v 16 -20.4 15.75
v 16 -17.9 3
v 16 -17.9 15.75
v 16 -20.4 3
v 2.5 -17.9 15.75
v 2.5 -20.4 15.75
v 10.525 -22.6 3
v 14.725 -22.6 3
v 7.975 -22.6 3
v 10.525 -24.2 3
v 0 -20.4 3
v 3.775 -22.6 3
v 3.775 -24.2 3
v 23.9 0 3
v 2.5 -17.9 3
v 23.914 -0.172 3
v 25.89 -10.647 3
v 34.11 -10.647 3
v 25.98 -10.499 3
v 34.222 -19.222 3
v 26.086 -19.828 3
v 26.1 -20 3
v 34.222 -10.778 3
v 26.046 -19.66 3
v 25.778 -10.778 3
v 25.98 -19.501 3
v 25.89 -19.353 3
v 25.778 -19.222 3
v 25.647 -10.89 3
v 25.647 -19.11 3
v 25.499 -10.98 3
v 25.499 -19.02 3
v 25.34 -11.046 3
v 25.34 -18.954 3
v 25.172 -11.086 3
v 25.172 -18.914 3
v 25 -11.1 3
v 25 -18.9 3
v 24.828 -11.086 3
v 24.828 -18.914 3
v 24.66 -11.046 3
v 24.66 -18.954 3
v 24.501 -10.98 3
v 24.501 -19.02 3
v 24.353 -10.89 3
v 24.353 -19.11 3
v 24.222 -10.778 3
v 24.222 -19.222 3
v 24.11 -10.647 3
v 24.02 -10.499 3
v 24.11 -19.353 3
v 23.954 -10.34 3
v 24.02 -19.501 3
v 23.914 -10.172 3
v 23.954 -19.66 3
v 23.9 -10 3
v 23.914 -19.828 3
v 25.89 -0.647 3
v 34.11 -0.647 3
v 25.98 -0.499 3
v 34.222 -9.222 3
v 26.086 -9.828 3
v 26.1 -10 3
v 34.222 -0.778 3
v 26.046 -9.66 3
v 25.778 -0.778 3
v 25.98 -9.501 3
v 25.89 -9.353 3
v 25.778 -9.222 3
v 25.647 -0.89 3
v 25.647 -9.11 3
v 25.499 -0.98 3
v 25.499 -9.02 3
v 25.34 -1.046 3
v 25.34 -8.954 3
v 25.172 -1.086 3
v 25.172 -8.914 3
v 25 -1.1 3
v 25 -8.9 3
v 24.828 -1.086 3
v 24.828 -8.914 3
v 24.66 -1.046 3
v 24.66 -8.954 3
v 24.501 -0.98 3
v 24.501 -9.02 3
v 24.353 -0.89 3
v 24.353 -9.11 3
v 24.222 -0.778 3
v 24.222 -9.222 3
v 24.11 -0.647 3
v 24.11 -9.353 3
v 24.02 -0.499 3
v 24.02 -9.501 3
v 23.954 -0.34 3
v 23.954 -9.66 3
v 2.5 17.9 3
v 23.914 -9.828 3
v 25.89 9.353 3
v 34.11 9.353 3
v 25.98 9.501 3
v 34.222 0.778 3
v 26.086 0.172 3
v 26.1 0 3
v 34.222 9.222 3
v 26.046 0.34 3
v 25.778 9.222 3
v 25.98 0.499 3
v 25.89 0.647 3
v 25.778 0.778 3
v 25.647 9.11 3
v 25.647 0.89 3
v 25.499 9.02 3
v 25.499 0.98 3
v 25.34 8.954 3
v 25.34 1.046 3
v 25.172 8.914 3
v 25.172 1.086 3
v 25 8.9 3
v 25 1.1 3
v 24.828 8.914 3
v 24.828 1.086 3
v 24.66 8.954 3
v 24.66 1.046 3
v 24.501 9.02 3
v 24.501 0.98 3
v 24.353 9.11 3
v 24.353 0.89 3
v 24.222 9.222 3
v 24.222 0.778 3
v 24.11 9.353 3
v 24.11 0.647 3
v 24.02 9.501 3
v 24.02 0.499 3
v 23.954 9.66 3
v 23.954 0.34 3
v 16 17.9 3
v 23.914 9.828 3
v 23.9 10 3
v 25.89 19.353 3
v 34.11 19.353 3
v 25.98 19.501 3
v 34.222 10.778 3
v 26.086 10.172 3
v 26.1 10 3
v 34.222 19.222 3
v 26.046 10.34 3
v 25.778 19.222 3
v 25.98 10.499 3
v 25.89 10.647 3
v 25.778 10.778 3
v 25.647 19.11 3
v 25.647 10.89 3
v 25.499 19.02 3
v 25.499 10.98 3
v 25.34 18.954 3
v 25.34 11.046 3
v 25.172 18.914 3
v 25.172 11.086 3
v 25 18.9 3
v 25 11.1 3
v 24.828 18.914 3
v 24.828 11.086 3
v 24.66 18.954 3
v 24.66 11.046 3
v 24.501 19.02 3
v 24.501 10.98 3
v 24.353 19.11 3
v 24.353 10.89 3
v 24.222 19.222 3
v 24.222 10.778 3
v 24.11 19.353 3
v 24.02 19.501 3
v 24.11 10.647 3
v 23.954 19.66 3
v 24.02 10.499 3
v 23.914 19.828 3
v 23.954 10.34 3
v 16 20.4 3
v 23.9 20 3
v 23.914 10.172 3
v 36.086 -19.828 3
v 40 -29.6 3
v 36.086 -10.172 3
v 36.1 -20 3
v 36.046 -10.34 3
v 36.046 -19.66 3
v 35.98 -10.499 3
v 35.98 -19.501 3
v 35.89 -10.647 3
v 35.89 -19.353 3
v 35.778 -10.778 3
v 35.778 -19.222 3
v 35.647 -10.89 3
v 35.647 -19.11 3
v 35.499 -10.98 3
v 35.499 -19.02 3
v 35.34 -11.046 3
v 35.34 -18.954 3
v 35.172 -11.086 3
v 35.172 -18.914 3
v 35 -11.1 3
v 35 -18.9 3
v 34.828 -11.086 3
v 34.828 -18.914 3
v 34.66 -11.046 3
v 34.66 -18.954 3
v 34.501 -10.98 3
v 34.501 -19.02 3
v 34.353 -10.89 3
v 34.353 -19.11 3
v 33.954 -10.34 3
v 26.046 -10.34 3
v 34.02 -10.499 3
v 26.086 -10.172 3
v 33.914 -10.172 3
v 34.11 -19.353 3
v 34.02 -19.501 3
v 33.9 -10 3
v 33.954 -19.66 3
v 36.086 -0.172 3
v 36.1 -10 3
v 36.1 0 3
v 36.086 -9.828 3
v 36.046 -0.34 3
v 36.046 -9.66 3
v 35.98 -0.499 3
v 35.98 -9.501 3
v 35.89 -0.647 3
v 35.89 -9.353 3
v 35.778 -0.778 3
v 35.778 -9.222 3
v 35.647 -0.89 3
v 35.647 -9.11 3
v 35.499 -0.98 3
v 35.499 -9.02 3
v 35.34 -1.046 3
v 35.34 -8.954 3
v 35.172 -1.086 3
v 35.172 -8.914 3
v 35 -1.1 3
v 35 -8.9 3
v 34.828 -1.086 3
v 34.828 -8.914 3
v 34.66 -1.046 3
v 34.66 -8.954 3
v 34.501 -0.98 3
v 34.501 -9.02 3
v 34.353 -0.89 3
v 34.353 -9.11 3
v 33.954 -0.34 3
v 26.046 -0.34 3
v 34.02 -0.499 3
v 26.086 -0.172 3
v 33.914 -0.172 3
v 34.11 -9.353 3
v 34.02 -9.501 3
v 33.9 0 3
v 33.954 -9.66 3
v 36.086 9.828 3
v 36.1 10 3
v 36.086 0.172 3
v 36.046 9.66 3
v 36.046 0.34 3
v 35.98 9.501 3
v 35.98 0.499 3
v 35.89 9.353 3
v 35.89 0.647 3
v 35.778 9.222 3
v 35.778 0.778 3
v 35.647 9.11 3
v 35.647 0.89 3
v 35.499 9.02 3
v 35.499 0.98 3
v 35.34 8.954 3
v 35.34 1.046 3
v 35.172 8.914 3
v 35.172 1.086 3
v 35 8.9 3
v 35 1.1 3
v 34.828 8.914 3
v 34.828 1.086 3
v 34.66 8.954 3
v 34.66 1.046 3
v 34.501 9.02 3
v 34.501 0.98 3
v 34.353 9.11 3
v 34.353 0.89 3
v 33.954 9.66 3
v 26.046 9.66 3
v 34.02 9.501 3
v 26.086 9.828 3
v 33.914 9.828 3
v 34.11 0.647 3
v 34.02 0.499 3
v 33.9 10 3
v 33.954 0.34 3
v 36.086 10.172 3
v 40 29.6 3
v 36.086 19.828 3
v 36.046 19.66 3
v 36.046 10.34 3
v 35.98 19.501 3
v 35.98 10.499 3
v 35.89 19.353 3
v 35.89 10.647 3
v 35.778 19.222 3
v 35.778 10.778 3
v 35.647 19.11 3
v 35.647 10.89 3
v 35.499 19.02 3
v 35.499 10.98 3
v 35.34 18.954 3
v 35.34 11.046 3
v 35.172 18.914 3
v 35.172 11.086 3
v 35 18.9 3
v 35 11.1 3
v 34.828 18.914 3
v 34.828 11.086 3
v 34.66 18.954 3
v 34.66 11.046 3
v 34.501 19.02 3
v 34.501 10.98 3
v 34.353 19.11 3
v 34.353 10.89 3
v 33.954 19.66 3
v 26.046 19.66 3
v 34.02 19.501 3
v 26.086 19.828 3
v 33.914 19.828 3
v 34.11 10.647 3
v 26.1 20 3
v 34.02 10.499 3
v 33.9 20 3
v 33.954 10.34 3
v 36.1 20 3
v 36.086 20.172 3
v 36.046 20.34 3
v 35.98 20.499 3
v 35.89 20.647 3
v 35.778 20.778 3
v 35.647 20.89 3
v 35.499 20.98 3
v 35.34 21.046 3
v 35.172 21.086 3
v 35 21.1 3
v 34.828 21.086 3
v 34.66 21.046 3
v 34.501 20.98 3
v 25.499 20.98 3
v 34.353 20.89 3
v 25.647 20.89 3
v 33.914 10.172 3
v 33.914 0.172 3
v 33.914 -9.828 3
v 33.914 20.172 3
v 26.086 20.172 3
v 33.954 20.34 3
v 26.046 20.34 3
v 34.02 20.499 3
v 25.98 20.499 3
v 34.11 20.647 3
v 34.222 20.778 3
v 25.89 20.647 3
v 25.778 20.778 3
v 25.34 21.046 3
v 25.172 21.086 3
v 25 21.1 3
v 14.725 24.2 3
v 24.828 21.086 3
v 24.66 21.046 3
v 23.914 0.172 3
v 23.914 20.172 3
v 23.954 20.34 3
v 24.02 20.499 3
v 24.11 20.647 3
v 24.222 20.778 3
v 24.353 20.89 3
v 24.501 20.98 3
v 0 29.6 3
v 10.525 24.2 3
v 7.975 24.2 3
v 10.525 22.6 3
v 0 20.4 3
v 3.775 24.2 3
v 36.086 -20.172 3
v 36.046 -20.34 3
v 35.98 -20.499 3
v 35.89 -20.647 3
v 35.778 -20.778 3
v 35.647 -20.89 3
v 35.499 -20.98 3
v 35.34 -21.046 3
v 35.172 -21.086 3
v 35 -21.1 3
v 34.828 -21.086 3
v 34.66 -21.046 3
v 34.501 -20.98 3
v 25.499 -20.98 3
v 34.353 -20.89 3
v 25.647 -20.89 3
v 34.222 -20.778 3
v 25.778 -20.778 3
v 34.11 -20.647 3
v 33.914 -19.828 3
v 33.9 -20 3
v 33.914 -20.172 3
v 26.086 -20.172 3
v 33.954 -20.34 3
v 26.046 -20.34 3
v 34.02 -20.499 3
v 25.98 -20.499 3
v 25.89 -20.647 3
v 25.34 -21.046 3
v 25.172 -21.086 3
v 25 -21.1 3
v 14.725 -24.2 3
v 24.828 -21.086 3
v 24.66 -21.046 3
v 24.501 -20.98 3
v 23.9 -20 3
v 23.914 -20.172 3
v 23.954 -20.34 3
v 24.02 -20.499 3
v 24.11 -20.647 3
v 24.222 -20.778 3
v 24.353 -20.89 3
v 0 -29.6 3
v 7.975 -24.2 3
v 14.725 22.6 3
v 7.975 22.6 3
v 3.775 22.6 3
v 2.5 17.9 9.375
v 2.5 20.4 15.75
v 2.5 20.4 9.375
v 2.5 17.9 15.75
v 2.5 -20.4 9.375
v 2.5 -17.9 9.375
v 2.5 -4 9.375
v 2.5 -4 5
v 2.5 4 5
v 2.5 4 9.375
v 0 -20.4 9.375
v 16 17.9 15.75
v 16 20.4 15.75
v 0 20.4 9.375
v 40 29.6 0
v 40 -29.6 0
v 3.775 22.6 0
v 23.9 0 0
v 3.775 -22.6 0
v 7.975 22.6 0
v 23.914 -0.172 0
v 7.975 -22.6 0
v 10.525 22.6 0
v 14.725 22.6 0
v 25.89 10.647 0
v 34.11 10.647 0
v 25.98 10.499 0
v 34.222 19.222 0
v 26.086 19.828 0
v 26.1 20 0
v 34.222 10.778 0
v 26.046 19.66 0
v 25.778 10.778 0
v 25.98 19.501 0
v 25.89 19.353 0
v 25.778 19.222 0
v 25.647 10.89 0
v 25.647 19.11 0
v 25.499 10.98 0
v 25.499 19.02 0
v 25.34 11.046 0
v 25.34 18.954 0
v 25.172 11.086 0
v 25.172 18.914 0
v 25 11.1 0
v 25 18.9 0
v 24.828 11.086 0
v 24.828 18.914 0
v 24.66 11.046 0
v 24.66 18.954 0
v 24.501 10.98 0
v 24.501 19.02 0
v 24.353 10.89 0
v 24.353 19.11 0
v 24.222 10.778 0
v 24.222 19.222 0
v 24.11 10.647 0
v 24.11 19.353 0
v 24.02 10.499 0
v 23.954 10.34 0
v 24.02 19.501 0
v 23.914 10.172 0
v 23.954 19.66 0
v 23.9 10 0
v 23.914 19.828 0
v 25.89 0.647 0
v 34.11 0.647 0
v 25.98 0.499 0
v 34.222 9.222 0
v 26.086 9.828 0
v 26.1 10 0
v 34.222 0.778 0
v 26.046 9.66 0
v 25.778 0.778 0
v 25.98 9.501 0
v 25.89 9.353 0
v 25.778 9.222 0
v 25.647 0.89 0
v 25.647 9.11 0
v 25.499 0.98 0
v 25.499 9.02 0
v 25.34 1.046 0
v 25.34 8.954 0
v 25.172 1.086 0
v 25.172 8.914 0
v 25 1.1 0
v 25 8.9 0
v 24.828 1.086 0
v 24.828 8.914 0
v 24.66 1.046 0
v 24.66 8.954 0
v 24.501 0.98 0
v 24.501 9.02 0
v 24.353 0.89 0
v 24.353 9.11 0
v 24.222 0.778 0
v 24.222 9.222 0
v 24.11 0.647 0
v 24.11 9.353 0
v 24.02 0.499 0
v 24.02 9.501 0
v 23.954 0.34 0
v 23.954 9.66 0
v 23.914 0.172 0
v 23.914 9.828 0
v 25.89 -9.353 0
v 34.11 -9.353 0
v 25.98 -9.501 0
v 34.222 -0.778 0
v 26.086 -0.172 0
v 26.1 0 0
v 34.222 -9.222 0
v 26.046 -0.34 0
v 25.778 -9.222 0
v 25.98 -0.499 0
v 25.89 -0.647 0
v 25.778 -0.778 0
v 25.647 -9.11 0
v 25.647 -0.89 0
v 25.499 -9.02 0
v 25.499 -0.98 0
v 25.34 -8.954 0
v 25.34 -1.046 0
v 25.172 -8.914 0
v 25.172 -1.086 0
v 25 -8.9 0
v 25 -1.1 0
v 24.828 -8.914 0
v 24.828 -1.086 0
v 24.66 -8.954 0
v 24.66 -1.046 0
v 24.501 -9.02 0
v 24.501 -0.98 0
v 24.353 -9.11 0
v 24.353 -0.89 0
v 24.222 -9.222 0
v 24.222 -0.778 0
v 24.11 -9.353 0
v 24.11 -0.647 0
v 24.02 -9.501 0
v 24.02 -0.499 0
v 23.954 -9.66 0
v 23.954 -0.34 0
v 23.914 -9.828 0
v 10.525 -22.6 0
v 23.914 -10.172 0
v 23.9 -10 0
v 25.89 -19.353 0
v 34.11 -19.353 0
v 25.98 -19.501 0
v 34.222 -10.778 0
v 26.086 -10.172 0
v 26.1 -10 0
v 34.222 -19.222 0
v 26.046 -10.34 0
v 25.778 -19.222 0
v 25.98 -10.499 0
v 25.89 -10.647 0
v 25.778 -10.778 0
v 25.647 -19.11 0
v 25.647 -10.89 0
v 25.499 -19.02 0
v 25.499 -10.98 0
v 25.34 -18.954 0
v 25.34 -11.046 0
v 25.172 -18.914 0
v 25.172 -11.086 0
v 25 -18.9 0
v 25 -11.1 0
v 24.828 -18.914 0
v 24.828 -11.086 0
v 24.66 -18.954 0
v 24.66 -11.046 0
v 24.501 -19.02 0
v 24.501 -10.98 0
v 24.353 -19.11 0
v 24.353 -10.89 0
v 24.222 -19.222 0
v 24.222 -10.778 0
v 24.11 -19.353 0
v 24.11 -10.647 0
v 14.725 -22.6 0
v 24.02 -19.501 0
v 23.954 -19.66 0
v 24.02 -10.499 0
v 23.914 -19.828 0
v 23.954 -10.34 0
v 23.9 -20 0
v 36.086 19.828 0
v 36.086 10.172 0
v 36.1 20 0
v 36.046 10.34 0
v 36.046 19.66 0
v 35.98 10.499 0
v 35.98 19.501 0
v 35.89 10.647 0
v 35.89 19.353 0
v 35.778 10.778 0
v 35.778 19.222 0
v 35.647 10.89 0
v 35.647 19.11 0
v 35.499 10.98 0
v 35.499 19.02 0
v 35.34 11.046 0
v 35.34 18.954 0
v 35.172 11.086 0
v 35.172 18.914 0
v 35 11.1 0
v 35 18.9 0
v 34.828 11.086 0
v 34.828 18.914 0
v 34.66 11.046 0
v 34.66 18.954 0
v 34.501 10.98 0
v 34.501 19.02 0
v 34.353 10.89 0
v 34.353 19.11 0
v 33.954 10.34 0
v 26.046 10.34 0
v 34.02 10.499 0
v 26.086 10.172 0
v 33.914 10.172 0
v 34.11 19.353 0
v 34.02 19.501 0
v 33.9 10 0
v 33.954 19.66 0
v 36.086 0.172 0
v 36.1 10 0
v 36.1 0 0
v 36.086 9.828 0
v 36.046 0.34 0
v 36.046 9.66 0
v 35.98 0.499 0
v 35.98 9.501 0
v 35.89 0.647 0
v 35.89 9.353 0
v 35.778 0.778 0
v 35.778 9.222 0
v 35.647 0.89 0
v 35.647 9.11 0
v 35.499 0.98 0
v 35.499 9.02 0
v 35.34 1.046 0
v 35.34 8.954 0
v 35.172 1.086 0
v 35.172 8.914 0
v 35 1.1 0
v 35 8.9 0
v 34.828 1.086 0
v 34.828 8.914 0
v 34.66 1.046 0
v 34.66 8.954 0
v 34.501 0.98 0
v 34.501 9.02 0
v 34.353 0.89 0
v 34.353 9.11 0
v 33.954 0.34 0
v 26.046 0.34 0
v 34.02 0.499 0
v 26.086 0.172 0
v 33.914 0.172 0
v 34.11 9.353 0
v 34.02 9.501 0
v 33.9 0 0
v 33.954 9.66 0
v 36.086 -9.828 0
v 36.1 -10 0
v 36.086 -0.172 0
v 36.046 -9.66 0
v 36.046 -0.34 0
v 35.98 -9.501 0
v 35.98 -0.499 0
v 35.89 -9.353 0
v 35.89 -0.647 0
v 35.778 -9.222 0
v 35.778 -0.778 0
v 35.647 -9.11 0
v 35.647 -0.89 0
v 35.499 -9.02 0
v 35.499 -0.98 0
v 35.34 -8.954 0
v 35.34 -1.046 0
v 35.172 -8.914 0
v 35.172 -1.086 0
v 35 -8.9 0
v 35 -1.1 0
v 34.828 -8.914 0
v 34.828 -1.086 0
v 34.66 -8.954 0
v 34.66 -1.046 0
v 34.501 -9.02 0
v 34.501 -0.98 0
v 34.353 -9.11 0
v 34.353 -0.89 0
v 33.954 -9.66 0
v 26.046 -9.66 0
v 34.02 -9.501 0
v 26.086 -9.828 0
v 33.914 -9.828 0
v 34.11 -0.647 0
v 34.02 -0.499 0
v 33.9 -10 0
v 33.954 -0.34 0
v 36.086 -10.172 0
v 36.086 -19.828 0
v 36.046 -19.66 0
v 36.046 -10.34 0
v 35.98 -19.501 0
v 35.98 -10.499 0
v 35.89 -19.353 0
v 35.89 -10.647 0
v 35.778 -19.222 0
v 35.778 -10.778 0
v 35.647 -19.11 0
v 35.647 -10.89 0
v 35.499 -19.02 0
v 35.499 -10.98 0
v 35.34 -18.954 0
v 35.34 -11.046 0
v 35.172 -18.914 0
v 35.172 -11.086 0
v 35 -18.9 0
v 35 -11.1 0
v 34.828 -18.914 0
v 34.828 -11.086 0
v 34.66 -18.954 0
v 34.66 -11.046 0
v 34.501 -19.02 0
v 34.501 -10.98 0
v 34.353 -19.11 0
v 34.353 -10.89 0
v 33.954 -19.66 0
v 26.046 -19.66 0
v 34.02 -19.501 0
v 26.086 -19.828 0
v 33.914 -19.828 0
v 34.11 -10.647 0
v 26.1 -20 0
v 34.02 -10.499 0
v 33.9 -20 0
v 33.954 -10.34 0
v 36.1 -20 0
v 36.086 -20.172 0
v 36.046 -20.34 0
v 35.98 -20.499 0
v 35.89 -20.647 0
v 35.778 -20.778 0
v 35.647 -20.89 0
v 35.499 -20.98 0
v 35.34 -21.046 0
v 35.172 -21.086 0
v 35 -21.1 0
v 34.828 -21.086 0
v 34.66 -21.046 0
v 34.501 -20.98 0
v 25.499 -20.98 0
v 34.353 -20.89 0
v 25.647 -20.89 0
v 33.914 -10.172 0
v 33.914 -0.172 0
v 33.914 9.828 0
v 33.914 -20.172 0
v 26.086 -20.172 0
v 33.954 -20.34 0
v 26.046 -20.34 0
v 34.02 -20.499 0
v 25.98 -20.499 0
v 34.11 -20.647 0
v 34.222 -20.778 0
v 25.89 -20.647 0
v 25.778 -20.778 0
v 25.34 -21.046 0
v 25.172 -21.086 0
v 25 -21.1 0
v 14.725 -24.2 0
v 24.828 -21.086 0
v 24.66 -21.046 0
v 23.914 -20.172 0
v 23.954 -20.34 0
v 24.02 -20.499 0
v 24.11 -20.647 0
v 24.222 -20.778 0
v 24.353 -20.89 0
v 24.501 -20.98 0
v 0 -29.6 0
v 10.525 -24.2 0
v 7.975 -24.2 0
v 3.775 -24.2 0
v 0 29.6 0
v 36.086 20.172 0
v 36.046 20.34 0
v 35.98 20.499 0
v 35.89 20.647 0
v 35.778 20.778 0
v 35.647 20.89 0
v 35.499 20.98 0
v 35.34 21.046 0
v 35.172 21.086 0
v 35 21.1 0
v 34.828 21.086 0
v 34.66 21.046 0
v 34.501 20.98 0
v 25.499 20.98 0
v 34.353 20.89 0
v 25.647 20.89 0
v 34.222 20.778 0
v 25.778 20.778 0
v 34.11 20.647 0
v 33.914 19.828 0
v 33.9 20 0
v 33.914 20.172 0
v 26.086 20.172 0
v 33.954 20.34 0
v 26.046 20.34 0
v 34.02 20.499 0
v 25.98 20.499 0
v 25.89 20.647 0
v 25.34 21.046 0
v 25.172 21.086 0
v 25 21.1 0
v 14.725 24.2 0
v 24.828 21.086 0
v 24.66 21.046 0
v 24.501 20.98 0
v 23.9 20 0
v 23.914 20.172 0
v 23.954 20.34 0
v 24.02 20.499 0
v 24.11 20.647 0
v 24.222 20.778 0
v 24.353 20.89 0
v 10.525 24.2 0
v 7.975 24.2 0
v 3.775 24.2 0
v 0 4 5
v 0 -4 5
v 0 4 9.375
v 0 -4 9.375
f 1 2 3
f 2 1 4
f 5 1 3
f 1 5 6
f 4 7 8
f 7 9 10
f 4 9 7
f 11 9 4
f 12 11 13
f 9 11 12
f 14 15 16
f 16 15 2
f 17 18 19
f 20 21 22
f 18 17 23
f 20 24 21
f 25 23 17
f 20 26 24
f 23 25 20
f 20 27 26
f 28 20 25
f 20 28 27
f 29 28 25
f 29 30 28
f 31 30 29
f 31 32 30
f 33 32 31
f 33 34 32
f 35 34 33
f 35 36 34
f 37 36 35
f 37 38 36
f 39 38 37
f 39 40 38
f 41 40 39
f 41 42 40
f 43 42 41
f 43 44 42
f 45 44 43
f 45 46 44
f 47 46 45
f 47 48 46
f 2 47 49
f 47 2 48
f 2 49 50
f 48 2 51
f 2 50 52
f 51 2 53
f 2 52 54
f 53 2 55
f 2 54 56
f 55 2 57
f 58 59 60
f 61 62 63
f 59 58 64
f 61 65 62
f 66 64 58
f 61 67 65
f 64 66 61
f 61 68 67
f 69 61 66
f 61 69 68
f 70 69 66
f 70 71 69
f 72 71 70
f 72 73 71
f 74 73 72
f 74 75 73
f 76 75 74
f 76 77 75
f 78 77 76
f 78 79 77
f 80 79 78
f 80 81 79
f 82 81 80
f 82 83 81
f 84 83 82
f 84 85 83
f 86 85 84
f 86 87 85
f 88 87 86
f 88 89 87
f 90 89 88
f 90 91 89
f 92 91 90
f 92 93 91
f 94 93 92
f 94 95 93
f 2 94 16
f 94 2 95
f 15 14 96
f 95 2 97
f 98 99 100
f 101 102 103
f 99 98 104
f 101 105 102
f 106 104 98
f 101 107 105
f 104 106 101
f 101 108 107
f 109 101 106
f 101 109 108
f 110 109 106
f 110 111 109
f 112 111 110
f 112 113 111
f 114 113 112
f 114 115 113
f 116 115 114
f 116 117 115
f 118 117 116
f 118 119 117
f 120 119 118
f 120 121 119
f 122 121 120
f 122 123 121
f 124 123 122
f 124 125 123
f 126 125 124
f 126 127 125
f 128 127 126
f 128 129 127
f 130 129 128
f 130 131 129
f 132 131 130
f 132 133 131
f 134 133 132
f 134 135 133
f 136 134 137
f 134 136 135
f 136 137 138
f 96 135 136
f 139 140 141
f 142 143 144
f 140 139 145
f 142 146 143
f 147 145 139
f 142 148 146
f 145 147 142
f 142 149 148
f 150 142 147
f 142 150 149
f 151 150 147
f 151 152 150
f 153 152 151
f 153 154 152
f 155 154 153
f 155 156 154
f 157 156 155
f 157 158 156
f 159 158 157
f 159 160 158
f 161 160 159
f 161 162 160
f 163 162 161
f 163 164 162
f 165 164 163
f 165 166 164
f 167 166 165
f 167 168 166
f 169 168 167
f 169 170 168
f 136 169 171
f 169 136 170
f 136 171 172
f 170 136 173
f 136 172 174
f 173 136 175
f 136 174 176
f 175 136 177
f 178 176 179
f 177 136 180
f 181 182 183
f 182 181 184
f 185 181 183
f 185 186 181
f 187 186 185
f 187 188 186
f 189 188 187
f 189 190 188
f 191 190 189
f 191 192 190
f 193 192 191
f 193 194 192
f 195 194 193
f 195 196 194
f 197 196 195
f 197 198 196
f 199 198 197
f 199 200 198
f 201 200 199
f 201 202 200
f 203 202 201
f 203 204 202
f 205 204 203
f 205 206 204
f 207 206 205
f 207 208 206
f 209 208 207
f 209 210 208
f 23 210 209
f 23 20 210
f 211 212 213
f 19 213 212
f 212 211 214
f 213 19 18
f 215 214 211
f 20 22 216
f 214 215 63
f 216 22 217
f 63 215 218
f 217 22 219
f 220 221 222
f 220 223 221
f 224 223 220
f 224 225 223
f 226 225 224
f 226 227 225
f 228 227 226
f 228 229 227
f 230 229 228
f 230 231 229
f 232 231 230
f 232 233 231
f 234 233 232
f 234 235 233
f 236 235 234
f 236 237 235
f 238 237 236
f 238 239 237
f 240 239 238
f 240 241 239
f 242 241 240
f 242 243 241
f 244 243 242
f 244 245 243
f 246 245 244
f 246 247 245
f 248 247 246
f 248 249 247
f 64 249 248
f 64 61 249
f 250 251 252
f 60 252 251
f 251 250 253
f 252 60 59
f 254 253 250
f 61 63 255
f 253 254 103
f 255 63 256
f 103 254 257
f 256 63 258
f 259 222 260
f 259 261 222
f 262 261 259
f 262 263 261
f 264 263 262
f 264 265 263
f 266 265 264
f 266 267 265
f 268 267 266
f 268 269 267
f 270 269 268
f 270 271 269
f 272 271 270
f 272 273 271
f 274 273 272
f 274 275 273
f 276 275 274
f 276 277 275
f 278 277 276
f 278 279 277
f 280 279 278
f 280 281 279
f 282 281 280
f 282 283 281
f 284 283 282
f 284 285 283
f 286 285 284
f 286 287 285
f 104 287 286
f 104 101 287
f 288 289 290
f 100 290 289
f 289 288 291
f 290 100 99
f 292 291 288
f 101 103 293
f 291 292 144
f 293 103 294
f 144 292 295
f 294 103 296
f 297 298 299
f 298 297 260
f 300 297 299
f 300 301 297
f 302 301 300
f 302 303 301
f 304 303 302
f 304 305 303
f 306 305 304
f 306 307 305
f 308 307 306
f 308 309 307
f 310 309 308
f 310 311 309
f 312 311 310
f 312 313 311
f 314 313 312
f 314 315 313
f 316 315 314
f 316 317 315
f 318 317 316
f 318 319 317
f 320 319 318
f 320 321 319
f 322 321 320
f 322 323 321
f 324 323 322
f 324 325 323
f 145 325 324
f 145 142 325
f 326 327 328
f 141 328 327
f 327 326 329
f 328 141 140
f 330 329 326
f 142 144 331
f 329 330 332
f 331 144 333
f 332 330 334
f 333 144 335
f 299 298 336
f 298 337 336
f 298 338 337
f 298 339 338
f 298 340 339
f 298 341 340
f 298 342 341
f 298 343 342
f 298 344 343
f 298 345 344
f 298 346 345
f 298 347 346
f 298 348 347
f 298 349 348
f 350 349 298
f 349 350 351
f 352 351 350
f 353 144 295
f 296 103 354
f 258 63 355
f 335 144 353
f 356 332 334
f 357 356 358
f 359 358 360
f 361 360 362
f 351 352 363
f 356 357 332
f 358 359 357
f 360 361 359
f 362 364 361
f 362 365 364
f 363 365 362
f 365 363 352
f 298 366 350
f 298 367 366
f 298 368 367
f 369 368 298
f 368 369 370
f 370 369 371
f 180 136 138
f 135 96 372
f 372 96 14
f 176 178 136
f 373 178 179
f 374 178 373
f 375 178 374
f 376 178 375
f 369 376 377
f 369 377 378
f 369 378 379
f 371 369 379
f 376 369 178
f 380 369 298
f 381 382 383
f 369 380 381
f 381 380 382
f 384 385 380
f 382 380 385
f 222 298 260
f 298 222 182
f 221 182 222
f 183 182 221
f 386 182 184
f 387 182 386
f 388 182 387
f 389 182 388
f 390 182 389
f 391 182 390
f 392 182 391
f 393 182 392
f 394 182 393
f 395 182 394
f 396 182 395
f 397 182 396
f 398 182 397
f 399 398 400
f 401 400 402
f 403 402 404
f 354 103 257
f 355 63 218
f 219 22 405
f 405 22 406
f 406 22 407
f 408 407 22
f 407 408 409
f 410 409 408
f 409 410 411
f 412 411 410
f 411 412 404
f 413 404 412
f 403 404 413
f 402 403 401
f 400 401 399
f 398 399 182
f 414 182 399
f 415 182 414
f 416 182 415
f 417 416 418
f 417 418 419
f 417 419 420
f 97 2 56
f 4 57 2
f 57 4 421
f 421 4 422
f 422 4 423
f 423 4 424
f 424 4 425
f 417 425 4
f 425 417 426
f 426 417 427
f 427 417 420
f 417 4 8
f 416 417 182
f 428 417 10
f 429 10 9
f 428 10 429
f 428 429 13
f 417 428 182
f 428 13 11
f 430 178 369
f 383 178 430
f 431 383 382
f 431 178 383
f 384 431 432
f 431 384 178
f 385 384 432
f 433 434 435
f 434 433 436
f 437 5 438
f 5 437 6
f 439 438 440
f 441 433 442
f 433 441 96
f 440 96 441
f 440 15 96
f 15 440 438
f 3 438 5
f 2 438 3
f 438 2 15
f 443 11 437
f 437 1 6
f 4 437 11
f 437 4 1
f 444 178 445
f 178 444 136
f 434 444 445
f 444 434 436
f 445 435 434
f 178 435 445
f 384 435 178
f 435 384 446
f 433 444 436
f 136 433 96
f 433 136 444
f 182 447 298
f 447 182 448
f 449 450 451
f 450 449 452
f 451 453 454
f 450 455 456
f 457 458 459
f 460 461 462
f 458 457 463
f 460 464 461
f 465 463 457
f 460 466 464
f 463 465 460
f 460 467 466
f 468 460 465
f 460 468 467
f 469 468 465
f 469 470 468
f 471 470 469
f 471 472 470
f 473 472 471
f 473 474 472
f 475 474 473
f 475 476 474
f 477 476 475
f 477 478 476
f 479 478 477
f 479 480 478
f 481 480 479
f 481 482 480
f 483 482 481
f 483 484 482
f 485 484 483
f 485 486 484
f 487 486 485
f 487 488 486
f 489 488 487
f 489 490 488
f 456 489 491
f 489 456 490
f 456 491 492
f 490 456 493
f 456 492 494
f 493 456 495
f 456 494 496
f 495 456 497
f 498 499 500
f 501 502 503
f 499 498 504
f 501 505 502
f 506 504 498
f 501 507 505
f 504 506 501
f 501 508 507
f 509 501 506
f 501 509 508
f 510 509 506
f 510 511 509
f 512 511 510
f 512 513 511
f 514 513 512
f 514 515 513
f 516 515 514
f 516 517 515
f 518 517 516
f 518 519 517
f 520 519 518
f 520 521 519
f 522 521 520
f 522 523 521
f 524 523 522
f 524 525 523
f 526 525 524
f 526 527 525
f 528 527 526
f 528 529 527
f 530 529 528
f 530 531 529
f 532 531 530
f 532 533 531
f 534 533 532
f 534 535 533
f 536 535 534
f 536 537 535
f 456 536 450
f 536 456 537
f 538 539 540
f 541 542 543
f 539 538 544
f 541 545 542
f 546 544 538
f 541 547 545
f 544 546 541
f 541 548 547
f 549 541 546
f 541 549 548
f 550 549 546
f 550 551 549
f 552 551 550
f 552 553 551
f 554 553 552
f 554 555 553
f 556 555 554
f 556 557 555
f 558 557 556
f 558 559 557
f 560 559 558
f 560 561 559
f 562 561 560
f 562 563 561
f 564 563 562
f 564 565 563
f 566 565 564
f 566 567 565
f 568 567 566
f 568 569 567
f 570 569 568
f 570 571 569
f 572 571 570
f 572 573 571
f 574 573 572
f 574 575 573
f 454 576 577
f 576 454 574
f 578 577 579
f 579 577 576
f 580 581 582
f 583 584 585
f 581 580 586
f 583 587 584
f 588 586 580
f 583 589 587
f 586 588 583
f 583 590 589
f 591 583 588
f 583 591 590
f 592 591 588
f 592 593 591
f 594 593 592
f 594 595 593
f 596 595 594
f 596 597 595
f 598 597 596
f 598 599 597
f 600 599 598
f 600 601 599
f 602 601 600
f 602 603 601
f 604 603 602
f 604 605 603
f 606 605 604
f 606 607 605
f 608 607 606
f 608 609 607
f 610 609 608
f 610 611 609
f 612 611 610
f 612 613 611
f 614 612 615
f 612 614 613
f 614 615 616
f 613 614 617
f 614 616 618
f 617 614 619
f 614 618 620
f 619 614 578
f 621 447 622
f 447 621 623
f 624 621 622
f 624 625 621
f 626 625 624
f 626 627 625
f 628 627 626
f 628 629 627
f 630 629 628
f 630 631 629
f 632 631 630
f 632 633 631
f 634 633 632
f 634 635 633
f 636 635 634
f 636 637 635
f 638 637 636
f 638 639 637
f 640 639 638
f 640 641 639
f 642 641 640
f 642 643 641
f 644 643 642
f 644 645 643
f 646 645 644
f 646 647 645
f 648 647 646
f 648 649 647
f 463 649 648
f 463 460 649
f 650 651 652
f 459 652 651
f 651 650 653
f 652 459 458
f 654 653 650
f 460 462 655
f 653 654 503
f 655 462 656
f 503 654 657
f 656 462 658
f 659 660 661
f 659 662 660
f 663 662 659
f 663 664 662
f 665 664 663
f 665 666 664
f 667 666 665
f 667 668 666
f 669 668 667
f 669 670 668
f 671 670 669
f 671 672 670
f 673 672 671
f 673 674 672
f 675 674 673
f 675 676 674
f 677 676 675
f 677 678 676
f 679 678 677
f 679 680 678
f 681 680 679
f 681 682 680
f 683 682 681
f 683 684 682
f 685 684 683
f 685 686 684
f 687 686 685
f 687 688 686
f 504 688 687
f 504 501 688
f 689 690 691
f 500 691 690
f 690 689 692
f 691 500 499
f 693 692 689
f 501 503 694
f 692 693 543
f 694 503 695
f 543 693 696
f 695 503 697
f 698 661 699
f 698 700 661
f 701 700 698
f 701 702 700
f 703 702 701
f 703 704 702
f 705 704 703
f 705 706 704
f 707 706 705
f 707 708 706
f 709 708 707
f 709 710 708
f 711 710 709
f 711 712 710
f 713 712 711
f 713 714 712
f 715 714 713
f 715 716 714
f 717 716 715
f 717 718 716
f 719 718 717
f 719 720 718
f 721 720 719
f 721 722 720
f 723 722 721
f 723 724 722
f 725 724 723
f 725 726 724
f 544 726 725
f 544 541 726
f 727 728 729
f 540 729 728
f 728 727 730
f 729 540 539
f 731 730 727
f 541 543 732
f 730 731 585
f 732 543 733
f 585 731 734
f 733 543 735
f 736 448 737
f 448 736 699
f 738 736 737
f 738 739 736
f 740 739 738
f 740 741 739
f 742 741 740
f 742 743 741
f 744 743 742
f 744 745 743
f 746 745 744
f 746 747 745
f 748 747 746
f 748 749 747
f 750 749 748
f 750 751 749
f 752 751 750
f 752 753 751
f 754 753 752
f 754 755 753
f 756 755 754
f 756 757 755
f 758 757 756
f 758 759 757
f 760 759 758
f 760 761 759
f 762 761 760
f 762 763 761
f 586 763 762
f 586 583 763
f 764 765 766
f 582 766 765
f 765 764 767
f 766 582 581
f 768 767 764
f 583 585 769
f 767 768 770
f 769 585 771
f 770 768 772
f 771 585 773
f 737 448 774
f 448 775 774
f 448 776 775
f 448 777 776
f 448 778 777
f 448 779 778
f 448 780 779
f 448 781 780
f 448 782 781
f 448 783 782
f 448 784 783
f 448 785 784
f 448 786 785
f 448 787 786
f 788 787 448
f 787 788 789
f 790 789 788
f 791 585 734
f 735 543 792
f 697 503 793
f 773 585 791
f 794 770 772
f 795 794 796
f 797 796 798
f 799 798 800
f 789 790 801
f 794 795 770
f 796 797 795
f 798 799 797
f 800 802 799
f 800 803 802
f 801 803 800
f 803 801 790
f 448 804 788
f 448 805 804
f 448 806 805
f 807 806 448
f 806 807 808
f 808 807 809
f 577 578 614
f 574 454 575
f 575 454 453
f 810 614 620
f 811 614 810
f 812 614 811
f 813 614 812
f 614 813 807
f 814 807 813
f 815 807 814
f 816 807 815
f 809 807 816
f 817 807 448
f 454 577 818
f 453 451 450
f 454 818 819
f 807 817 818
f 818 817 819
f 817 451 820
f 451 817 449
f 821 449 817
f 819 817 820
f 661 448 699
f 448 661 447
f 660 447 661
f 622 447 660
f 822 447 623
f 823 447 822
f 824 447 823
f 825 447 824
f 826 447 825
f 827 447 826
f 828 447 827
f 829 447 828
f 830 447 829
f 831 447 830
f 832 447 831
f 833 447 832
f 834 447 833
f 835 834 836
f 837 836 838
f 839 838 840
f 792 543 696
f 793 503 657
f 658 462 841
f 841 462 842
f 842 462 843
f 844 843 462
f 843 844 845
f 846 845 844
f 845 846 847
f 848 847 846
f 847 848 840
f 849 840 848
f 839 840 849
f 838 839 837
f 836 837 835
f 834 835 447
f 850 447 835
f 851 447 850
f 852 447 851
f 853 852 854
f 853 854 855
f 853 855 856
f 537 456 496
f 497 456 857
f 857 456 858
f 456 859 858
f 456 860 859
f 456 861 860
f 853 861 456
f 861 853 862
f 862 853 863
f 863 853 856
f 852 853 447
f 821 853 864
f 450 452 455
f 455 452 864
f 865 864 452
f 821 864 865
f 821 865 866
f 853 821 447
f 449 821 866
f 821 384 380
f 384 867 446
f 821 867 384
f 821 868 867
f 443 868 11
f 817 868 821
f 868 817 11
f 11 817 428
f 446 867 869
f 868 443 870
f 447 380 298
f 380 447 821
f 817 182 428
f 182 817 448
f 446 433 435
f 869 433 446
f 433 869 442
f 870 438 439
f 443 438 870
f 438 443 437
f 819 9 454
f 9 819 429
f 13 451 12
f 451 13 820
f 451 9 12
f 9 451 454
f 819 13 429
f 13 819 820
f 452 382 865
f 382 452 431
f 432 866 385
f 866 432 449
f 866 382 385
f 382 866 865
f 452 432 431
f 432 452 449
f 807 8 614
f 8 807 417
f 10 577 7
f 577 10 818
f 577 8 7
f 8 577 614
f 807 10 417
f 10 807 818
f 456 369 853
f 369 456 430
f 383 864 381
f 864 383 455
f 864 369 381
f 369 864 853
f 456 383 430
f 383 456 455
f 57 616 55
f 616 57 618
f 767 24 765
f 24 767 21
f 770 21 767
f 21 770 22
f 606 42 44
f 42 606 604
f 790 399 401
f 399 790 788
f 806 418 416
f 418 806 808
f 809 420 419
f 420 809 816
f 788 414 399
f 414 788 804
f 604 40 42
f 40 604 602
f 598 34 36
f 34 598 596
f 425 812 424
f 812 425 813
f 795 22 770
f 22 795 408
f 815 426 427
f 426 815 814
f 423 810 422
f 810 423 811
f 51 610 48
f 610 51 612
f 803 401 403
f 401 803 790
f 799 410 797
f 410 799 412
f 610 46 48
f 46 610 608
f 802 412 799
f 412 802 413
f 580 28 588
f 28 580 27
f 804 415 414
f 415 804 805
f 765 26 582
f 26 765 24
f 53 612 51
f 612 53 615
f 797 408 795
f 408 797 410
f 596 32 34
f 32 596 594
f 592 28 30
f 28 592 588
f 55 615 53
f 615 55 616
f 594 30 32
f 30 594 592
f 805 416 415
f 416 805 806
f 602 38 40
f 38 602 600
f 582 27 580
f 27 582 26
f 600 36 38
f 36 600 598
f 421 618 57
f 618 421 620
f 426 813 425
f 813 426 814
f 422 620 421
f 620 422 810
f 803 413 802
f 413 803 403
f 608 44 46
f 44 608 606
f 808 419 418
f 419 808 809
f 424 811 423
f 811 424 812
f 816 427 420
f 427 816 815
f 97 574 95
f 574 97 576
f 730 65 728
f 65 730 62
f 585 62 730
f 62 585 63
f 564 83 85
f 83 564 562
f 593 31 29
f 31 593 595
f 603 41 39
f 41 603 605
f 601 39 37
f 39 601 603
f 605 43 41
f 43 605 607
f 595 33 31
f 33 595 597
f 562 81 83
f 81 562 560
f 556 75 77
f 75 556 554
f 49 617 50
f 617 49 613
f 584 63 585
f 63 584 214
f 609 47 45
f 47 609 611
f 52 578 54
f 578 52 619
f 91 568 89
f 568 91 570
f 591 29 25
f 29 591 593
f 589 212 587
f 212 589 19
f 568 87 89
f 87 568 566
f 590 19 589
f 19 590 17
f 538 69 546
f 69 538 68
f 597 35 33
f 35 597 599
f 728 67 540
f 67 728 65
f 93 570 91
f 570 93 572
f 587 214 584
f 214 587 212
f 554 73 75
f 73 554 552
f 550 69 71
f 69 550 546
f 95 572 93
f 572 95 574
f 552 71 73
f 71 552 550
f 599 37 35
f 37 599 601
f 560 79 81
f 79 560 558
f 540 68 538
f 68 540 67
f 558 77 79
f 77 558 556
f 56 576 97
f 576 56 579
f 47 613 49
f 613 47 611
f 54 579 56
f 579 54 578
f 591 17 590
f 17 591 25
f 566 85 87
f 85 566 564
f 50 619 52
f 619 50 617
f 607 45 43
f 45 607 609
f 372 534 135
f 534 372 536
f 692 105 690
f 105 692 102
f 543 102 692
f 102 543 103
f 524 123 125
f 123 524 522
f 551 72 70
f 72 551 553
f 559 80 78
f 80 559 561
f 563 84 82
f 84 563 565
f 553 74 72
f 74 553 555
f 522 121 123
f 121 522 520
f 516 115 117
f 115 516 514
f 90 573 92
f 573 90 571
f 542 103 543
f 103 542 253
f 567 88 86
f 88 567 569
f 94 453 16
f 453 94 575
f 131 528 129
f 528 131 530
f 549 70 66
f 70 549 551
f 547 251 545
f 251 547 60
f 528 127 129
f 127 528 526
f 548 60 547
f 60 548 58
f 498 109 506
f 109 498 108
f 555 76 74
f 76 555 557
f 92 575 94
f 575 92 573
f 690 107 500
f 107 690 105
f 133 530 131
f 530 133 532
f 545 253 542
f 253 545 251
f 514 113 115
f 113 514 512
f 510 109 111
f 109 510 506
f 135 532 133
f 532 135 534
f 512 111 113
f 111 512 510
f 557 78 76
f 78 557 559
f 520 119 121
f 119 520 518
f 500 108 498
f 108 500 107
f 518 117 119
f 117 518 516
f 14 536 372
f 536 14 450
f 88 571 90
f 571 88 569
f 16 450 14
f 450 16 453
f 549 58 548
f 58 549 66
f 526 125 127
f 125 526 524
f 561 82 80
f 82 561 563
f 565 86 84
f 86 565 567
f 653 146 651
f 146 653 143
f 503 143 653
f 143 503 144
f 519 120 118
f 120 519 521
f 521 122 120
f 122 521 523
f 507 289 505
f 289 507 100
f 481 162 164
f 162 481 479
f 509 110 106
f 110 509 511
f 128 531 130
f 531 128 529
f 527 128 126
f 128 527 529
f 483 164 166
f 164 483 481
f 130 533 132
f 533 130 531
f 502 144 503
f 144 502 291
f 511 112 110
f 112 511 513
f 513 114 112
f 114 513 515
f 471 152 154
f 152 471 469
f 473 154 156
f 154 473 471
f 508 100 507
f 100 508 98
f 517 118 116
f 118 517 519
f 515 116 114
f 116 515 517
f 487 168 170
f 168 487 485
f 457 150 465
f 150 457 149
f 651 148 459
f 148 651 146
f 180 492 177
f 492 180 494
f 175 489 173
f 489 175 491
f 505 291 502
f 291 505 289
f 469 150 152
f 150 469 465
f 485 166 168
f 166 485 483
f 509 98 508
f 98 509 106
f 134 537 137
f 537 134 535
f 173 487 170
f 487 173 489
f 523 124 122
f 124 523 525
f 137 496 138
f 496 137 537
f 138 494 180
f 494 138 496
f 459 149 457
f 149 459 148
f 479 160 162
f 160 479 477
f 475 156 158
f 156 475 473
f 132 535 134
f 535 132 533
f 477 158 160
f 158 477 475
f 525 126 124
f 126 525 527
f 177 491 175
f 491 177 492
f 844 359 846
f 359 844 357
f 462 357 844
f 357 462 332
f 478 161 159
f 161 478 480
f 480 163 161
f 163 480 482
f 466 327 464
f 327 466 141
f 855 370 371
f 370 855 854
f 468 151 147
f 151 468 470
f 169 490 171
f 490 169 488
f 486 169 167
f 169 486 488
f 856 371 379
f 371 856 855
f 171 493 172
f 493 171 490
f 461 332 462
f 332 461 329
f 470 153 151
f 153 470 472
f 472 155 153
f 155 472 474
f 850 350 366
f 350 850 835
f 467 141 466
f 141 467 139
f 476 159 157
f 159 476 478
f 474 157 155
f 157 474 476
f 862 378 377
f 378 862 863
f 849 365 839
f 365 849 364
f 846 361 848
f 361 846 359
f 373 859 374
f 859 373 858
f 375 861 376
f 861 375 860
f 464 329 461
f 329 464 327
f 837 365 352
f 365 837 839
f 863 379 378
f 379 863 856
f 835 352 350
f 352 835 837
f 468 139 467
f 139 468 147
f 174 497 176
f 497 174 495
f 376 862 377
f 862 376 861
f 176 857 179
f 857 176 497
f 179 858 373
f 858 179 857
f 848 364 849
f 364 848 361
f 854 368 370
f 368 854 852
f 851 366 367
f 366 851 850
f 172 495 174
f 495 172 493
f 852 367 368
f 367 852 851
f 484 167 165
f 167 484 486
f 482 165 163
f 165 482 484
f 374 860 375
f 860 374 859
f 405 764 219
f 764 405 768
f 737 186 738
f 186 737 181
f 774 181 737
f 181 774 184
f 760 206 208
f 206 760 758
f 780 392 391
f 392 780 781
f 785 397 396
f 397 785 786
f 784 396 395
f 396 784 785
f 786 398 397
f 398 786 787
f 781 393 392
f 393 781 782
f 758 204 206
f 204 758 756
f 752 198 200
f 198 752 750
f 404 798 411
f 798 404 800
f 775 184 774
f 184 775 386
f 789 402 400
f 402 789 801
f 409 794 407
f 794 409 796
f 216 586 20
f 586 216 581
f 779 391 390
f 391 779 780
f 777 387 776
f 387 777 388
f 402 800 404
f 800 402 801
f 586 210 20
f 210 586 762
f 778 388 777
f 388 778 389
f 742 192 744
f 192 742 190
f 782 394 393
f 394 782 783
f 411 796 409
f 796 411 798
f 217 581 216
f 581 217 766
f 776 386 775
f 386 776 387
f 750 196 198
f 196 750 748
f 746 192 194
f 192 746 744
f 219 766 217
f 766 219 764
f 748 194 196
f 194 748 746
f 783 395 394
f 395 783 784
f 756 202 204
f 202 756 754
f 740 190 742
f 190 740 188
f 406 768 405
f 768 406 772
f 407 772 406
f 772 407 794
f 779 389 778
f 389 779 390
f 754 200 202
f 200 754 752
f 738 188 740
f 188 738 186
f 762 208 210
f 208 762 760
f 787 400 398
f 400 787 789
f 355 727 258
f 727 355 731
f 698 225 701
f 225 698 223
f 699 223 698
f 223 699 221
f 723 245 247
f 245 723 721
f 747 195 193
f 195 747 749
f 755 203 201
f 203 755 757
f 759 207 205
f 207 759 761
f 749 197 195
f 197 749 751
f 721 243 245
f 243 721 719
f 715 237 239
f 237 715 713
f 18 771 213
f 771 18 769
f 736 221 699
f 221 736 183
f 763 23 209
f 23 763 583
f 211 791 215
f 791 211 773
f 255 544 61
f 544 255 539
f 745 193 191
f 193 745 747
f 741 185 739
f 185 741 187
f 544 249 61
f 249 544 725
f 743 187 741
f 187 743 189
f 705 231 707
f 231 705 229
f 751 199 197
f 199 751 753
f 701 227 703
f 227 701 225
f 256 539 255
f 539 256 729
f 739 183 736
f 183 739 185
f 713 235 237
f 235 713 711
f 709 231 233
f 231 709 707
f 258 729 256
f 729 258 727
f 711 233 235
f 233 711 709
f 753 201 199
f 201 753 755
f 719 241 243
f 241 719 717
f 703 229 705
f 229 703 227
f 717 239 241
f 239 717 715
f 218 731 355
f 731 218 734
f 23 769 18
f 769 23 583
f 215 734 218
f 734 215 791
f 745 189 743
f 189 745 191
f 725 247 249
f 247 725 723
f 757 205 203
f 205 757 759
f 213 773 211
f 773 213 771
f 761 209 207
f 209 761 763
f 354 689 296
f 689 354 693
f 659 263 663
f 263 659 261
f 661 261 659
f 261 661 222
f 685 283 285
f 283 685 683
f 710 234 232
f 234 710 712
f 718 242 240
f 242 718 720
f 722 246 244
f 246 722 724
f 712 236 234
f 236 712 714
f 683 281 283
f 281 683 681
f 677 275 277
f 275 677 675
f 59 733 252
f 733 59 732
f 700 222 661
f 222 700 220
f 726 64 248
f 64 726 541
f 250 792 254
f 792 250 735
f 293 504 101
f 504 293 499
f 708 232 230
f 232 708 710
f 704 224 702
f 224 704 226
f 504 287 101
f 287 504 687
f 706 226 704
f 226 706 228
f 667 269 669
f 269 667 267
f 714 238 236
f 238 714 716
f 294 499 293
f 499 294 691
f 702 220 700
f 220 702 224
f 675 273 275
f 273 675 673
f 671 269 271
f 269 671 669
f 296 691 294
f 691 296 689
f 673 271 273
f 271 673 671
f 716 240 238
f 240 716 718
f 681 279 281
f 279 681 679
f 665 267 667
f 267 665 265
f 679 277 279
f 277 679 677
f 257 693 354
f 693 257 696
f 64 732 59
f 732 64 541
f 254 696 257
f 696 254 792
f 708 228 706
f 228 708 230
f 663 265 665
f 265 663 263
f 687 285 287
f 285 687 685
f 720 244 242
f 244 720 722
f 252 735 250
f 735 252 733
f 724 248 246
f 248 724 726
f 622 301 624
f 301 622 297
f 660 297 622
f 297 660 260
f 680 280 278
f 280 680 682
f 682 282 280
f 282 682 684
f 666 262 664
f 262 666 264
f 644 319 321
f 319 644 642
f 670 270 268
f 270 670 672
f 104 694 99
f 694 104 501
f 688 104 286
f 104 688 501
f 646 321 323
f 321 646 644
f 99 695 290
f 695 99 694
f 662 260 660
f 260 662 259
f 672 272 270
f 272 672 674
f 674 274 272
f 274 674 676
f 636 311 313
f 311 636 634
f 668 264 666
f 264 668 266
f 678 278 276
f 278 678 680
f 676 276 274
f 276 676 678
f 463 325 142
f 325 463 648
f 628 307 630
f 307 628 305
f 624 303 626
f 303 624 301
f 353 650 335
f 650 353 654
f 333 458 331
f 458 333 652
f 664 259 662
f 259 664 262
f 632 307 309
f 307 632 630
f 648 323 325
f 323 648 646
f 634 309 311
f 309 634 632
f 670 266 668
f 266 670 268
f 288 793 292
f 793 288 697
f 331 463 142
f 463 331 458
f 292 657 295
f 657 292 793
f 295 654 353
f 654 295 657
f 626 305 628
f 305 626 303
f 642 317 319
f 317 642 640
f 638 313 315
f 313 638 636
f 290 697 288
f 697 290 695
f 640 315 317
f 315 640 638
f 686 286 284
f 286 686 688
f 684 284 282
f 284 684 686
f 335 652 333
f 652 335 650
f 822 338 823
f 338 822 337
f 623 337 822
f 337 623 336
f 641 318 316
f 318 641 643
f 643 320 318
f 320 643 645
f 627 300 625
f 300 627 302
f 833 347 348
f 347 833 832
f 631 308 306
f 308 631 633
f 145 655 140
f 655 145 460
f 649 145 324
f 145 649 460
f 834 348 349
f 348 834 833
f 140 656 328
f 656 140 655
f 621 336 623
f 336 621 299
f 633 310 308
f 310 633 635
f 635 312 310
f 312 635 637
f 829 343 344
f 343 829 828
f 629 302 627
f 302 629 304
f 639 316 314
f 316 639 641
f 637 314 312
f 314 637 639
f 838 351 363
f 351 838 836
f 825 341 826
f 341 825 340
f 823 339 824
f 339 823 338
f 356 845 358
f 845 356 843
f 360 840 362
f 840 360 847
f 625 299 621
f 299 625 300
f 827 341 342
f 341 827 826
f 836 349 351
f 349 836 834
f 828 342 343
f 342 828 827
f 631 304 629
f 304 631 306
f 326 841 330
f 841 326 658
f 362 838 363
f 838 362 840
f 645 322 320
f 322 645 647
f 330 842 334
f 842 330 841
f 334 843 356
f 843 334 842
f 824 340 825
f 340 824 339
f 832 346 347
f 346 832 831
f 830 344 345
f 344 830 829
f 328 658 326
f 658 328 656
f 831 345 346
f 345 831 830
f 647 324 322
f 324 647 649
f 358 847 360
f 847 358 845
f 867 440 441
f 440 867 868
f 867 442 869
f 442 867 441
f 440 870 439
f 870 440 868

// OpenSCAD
// Soporte de LiDAR (TF-Luna o TF03) — COMPILADO (OpenSCAD 2021.01), NO IMPRESO (ver VARIANTES.md).
// Ejes: X = adelante (el frente del sensor mira a +X), Y = izquierda, Z = arriba. Cabeceo + = frente hacia arriba.
//
// Cuna abierta por arriba y por el frente (las lentes quedan libres), pared trasera baja con muesca para el cable,
// y ranuras para amarras plásticas que sujetan el sensor sin depender de sus agujeros de montaje.
// fijacion = "cuadricula": base con agujeros M2 de 10 mm para la cuna del pan-tilt (x = 15, 25, 35; y = -20..20).
// fijacion = "chasis"    : base con 4 ranuras M3 para el chasis; `cabeceo_deg` inclina el sensor (cuña) para dejarlo a -3° (D-064: nariz del sensor hacia abajo; el signo no se ha probado).
//
// Medidas del sensor: fichas oficiales (ver abajo). Para el TF03 del chasis usa mejor soporte_tf03_colgante.scad (con sus roscas M3).

modelo = "luna";                 // "luna" | "tf03"
fijacion = "cuadricula";         // "cuadricula" | "chasis"
cabeceo_deg = -3;                // solo "chasis": inclinación del sensor (-3 en las variantes C a F del TF03, D-064)
$fn = 40;

// medidas de las fichas oficiales: Luna 13.5 (fondo, a lo largo de la mirada) x 35 x 21.25; TF03 42.9 (largo, a lo largo de la mirada) x 44 x 31.8
dims = (modelo == "luna") ? [13.5, 35, 21.25] : [42.9, 44, 31.8];   // largo (X), ancho (Y), alto (Z); el TF03 aquí se apoya sobre su cara de 44 x 42.9 (fondo 31.8 = alto)
S_L = dims[0]; S_W = dims[1]; S_H = dims[2];
tol = 0.4;
pared = 2.5;
base_t = 3;
alto_pared = 0.6 * S_H;
amarra_w = 4.2; amarra_t = 1.6;  // ranura para amarra plástica de 3.6 mm de ancho

BL = max(S_L + 2*pared, fijacion == "cuadricula" ? 40 : 0) + (fijacion == "chasis" ? 20 : 0);
BW = S_W + 2*pared + 2*(amarra_t + 4) + 8;

module cuna() {
    difference() {
        union() {
            translate([0, -BW/2, 0]) cube([BL, BW, base_t]);
            // paredes laterales y pared trasera baja
            for (s = [-1, 1]) translate([pared, s*(S_W/2 + tol) + (s > 0 ? 0 : -pared), base_t]) cube([S_L, pared, alto_pared]);
            translate([0, -(S_W/2 + tol + pared), base_t]) cube([pared, S_W + 2*(tol + pared), alto_pared * 0.5]);
        }
        // muesca del cable en la pared trasera
        translate([-1, -4, base_t + 2]) cube([pared + 2, 8, alto_pared]);
        // ranuras de amarra: 2 posiciones a lo largo del sensor, a cada lado
        for (px = [pared + S_L*0.25, pared + S_L*0.75]) for (s = [-1, 1])
            translate([px - amarra_w/2, s*(S_W/2 + tol + pared + 3) - amarra_t/2, -1]) cube([amarra_w, amarra_t, base_t + 2]);
        if (fijacion == "cuadricula") {
            for (x = [25, 35]) for (y = [-20, -10, 0, 10, 20]) translate([x, y, -1]) cylinder(d = 2.2, h = base_t + 2);   // delante del sensor (x > 16)
        }
    }
}

if (fijacion == "cuadricula") {
    cuna();
} else {
    // placa plana con ranuras M3 + cuña que lleva la cuna inclinada `cabeceo_deg` alrededor de su borde trasero
    difference() {
        union() {
            translate([0, -BW/2, 0]) cube([BL, BW, base_t]);
            translate([0, 0, base_t]) hull() {
                translate([0, -BW/2, 0]) cube([BL, BW, 0.01]);
                rotate([0, -cabeceo_deg, 0]) translate([0, -BW/2, base_t]) cube([BL, BW, 0.01]);
            }
            translate([0, 0, base_t]) rotate([0, -cabeceo_deg, 0]) cuna();
        }
        for (sx = [-1, 1]) for (sy = [-1, 1]) hull() for (dx = [-3, 3])
            translate([BL/2 + sx*(BL/2 - 6) + dx, sy*(BW/2 - 3.5), -1]) cylinder(d = 3.4, h = base_t + 2);
    }
}
